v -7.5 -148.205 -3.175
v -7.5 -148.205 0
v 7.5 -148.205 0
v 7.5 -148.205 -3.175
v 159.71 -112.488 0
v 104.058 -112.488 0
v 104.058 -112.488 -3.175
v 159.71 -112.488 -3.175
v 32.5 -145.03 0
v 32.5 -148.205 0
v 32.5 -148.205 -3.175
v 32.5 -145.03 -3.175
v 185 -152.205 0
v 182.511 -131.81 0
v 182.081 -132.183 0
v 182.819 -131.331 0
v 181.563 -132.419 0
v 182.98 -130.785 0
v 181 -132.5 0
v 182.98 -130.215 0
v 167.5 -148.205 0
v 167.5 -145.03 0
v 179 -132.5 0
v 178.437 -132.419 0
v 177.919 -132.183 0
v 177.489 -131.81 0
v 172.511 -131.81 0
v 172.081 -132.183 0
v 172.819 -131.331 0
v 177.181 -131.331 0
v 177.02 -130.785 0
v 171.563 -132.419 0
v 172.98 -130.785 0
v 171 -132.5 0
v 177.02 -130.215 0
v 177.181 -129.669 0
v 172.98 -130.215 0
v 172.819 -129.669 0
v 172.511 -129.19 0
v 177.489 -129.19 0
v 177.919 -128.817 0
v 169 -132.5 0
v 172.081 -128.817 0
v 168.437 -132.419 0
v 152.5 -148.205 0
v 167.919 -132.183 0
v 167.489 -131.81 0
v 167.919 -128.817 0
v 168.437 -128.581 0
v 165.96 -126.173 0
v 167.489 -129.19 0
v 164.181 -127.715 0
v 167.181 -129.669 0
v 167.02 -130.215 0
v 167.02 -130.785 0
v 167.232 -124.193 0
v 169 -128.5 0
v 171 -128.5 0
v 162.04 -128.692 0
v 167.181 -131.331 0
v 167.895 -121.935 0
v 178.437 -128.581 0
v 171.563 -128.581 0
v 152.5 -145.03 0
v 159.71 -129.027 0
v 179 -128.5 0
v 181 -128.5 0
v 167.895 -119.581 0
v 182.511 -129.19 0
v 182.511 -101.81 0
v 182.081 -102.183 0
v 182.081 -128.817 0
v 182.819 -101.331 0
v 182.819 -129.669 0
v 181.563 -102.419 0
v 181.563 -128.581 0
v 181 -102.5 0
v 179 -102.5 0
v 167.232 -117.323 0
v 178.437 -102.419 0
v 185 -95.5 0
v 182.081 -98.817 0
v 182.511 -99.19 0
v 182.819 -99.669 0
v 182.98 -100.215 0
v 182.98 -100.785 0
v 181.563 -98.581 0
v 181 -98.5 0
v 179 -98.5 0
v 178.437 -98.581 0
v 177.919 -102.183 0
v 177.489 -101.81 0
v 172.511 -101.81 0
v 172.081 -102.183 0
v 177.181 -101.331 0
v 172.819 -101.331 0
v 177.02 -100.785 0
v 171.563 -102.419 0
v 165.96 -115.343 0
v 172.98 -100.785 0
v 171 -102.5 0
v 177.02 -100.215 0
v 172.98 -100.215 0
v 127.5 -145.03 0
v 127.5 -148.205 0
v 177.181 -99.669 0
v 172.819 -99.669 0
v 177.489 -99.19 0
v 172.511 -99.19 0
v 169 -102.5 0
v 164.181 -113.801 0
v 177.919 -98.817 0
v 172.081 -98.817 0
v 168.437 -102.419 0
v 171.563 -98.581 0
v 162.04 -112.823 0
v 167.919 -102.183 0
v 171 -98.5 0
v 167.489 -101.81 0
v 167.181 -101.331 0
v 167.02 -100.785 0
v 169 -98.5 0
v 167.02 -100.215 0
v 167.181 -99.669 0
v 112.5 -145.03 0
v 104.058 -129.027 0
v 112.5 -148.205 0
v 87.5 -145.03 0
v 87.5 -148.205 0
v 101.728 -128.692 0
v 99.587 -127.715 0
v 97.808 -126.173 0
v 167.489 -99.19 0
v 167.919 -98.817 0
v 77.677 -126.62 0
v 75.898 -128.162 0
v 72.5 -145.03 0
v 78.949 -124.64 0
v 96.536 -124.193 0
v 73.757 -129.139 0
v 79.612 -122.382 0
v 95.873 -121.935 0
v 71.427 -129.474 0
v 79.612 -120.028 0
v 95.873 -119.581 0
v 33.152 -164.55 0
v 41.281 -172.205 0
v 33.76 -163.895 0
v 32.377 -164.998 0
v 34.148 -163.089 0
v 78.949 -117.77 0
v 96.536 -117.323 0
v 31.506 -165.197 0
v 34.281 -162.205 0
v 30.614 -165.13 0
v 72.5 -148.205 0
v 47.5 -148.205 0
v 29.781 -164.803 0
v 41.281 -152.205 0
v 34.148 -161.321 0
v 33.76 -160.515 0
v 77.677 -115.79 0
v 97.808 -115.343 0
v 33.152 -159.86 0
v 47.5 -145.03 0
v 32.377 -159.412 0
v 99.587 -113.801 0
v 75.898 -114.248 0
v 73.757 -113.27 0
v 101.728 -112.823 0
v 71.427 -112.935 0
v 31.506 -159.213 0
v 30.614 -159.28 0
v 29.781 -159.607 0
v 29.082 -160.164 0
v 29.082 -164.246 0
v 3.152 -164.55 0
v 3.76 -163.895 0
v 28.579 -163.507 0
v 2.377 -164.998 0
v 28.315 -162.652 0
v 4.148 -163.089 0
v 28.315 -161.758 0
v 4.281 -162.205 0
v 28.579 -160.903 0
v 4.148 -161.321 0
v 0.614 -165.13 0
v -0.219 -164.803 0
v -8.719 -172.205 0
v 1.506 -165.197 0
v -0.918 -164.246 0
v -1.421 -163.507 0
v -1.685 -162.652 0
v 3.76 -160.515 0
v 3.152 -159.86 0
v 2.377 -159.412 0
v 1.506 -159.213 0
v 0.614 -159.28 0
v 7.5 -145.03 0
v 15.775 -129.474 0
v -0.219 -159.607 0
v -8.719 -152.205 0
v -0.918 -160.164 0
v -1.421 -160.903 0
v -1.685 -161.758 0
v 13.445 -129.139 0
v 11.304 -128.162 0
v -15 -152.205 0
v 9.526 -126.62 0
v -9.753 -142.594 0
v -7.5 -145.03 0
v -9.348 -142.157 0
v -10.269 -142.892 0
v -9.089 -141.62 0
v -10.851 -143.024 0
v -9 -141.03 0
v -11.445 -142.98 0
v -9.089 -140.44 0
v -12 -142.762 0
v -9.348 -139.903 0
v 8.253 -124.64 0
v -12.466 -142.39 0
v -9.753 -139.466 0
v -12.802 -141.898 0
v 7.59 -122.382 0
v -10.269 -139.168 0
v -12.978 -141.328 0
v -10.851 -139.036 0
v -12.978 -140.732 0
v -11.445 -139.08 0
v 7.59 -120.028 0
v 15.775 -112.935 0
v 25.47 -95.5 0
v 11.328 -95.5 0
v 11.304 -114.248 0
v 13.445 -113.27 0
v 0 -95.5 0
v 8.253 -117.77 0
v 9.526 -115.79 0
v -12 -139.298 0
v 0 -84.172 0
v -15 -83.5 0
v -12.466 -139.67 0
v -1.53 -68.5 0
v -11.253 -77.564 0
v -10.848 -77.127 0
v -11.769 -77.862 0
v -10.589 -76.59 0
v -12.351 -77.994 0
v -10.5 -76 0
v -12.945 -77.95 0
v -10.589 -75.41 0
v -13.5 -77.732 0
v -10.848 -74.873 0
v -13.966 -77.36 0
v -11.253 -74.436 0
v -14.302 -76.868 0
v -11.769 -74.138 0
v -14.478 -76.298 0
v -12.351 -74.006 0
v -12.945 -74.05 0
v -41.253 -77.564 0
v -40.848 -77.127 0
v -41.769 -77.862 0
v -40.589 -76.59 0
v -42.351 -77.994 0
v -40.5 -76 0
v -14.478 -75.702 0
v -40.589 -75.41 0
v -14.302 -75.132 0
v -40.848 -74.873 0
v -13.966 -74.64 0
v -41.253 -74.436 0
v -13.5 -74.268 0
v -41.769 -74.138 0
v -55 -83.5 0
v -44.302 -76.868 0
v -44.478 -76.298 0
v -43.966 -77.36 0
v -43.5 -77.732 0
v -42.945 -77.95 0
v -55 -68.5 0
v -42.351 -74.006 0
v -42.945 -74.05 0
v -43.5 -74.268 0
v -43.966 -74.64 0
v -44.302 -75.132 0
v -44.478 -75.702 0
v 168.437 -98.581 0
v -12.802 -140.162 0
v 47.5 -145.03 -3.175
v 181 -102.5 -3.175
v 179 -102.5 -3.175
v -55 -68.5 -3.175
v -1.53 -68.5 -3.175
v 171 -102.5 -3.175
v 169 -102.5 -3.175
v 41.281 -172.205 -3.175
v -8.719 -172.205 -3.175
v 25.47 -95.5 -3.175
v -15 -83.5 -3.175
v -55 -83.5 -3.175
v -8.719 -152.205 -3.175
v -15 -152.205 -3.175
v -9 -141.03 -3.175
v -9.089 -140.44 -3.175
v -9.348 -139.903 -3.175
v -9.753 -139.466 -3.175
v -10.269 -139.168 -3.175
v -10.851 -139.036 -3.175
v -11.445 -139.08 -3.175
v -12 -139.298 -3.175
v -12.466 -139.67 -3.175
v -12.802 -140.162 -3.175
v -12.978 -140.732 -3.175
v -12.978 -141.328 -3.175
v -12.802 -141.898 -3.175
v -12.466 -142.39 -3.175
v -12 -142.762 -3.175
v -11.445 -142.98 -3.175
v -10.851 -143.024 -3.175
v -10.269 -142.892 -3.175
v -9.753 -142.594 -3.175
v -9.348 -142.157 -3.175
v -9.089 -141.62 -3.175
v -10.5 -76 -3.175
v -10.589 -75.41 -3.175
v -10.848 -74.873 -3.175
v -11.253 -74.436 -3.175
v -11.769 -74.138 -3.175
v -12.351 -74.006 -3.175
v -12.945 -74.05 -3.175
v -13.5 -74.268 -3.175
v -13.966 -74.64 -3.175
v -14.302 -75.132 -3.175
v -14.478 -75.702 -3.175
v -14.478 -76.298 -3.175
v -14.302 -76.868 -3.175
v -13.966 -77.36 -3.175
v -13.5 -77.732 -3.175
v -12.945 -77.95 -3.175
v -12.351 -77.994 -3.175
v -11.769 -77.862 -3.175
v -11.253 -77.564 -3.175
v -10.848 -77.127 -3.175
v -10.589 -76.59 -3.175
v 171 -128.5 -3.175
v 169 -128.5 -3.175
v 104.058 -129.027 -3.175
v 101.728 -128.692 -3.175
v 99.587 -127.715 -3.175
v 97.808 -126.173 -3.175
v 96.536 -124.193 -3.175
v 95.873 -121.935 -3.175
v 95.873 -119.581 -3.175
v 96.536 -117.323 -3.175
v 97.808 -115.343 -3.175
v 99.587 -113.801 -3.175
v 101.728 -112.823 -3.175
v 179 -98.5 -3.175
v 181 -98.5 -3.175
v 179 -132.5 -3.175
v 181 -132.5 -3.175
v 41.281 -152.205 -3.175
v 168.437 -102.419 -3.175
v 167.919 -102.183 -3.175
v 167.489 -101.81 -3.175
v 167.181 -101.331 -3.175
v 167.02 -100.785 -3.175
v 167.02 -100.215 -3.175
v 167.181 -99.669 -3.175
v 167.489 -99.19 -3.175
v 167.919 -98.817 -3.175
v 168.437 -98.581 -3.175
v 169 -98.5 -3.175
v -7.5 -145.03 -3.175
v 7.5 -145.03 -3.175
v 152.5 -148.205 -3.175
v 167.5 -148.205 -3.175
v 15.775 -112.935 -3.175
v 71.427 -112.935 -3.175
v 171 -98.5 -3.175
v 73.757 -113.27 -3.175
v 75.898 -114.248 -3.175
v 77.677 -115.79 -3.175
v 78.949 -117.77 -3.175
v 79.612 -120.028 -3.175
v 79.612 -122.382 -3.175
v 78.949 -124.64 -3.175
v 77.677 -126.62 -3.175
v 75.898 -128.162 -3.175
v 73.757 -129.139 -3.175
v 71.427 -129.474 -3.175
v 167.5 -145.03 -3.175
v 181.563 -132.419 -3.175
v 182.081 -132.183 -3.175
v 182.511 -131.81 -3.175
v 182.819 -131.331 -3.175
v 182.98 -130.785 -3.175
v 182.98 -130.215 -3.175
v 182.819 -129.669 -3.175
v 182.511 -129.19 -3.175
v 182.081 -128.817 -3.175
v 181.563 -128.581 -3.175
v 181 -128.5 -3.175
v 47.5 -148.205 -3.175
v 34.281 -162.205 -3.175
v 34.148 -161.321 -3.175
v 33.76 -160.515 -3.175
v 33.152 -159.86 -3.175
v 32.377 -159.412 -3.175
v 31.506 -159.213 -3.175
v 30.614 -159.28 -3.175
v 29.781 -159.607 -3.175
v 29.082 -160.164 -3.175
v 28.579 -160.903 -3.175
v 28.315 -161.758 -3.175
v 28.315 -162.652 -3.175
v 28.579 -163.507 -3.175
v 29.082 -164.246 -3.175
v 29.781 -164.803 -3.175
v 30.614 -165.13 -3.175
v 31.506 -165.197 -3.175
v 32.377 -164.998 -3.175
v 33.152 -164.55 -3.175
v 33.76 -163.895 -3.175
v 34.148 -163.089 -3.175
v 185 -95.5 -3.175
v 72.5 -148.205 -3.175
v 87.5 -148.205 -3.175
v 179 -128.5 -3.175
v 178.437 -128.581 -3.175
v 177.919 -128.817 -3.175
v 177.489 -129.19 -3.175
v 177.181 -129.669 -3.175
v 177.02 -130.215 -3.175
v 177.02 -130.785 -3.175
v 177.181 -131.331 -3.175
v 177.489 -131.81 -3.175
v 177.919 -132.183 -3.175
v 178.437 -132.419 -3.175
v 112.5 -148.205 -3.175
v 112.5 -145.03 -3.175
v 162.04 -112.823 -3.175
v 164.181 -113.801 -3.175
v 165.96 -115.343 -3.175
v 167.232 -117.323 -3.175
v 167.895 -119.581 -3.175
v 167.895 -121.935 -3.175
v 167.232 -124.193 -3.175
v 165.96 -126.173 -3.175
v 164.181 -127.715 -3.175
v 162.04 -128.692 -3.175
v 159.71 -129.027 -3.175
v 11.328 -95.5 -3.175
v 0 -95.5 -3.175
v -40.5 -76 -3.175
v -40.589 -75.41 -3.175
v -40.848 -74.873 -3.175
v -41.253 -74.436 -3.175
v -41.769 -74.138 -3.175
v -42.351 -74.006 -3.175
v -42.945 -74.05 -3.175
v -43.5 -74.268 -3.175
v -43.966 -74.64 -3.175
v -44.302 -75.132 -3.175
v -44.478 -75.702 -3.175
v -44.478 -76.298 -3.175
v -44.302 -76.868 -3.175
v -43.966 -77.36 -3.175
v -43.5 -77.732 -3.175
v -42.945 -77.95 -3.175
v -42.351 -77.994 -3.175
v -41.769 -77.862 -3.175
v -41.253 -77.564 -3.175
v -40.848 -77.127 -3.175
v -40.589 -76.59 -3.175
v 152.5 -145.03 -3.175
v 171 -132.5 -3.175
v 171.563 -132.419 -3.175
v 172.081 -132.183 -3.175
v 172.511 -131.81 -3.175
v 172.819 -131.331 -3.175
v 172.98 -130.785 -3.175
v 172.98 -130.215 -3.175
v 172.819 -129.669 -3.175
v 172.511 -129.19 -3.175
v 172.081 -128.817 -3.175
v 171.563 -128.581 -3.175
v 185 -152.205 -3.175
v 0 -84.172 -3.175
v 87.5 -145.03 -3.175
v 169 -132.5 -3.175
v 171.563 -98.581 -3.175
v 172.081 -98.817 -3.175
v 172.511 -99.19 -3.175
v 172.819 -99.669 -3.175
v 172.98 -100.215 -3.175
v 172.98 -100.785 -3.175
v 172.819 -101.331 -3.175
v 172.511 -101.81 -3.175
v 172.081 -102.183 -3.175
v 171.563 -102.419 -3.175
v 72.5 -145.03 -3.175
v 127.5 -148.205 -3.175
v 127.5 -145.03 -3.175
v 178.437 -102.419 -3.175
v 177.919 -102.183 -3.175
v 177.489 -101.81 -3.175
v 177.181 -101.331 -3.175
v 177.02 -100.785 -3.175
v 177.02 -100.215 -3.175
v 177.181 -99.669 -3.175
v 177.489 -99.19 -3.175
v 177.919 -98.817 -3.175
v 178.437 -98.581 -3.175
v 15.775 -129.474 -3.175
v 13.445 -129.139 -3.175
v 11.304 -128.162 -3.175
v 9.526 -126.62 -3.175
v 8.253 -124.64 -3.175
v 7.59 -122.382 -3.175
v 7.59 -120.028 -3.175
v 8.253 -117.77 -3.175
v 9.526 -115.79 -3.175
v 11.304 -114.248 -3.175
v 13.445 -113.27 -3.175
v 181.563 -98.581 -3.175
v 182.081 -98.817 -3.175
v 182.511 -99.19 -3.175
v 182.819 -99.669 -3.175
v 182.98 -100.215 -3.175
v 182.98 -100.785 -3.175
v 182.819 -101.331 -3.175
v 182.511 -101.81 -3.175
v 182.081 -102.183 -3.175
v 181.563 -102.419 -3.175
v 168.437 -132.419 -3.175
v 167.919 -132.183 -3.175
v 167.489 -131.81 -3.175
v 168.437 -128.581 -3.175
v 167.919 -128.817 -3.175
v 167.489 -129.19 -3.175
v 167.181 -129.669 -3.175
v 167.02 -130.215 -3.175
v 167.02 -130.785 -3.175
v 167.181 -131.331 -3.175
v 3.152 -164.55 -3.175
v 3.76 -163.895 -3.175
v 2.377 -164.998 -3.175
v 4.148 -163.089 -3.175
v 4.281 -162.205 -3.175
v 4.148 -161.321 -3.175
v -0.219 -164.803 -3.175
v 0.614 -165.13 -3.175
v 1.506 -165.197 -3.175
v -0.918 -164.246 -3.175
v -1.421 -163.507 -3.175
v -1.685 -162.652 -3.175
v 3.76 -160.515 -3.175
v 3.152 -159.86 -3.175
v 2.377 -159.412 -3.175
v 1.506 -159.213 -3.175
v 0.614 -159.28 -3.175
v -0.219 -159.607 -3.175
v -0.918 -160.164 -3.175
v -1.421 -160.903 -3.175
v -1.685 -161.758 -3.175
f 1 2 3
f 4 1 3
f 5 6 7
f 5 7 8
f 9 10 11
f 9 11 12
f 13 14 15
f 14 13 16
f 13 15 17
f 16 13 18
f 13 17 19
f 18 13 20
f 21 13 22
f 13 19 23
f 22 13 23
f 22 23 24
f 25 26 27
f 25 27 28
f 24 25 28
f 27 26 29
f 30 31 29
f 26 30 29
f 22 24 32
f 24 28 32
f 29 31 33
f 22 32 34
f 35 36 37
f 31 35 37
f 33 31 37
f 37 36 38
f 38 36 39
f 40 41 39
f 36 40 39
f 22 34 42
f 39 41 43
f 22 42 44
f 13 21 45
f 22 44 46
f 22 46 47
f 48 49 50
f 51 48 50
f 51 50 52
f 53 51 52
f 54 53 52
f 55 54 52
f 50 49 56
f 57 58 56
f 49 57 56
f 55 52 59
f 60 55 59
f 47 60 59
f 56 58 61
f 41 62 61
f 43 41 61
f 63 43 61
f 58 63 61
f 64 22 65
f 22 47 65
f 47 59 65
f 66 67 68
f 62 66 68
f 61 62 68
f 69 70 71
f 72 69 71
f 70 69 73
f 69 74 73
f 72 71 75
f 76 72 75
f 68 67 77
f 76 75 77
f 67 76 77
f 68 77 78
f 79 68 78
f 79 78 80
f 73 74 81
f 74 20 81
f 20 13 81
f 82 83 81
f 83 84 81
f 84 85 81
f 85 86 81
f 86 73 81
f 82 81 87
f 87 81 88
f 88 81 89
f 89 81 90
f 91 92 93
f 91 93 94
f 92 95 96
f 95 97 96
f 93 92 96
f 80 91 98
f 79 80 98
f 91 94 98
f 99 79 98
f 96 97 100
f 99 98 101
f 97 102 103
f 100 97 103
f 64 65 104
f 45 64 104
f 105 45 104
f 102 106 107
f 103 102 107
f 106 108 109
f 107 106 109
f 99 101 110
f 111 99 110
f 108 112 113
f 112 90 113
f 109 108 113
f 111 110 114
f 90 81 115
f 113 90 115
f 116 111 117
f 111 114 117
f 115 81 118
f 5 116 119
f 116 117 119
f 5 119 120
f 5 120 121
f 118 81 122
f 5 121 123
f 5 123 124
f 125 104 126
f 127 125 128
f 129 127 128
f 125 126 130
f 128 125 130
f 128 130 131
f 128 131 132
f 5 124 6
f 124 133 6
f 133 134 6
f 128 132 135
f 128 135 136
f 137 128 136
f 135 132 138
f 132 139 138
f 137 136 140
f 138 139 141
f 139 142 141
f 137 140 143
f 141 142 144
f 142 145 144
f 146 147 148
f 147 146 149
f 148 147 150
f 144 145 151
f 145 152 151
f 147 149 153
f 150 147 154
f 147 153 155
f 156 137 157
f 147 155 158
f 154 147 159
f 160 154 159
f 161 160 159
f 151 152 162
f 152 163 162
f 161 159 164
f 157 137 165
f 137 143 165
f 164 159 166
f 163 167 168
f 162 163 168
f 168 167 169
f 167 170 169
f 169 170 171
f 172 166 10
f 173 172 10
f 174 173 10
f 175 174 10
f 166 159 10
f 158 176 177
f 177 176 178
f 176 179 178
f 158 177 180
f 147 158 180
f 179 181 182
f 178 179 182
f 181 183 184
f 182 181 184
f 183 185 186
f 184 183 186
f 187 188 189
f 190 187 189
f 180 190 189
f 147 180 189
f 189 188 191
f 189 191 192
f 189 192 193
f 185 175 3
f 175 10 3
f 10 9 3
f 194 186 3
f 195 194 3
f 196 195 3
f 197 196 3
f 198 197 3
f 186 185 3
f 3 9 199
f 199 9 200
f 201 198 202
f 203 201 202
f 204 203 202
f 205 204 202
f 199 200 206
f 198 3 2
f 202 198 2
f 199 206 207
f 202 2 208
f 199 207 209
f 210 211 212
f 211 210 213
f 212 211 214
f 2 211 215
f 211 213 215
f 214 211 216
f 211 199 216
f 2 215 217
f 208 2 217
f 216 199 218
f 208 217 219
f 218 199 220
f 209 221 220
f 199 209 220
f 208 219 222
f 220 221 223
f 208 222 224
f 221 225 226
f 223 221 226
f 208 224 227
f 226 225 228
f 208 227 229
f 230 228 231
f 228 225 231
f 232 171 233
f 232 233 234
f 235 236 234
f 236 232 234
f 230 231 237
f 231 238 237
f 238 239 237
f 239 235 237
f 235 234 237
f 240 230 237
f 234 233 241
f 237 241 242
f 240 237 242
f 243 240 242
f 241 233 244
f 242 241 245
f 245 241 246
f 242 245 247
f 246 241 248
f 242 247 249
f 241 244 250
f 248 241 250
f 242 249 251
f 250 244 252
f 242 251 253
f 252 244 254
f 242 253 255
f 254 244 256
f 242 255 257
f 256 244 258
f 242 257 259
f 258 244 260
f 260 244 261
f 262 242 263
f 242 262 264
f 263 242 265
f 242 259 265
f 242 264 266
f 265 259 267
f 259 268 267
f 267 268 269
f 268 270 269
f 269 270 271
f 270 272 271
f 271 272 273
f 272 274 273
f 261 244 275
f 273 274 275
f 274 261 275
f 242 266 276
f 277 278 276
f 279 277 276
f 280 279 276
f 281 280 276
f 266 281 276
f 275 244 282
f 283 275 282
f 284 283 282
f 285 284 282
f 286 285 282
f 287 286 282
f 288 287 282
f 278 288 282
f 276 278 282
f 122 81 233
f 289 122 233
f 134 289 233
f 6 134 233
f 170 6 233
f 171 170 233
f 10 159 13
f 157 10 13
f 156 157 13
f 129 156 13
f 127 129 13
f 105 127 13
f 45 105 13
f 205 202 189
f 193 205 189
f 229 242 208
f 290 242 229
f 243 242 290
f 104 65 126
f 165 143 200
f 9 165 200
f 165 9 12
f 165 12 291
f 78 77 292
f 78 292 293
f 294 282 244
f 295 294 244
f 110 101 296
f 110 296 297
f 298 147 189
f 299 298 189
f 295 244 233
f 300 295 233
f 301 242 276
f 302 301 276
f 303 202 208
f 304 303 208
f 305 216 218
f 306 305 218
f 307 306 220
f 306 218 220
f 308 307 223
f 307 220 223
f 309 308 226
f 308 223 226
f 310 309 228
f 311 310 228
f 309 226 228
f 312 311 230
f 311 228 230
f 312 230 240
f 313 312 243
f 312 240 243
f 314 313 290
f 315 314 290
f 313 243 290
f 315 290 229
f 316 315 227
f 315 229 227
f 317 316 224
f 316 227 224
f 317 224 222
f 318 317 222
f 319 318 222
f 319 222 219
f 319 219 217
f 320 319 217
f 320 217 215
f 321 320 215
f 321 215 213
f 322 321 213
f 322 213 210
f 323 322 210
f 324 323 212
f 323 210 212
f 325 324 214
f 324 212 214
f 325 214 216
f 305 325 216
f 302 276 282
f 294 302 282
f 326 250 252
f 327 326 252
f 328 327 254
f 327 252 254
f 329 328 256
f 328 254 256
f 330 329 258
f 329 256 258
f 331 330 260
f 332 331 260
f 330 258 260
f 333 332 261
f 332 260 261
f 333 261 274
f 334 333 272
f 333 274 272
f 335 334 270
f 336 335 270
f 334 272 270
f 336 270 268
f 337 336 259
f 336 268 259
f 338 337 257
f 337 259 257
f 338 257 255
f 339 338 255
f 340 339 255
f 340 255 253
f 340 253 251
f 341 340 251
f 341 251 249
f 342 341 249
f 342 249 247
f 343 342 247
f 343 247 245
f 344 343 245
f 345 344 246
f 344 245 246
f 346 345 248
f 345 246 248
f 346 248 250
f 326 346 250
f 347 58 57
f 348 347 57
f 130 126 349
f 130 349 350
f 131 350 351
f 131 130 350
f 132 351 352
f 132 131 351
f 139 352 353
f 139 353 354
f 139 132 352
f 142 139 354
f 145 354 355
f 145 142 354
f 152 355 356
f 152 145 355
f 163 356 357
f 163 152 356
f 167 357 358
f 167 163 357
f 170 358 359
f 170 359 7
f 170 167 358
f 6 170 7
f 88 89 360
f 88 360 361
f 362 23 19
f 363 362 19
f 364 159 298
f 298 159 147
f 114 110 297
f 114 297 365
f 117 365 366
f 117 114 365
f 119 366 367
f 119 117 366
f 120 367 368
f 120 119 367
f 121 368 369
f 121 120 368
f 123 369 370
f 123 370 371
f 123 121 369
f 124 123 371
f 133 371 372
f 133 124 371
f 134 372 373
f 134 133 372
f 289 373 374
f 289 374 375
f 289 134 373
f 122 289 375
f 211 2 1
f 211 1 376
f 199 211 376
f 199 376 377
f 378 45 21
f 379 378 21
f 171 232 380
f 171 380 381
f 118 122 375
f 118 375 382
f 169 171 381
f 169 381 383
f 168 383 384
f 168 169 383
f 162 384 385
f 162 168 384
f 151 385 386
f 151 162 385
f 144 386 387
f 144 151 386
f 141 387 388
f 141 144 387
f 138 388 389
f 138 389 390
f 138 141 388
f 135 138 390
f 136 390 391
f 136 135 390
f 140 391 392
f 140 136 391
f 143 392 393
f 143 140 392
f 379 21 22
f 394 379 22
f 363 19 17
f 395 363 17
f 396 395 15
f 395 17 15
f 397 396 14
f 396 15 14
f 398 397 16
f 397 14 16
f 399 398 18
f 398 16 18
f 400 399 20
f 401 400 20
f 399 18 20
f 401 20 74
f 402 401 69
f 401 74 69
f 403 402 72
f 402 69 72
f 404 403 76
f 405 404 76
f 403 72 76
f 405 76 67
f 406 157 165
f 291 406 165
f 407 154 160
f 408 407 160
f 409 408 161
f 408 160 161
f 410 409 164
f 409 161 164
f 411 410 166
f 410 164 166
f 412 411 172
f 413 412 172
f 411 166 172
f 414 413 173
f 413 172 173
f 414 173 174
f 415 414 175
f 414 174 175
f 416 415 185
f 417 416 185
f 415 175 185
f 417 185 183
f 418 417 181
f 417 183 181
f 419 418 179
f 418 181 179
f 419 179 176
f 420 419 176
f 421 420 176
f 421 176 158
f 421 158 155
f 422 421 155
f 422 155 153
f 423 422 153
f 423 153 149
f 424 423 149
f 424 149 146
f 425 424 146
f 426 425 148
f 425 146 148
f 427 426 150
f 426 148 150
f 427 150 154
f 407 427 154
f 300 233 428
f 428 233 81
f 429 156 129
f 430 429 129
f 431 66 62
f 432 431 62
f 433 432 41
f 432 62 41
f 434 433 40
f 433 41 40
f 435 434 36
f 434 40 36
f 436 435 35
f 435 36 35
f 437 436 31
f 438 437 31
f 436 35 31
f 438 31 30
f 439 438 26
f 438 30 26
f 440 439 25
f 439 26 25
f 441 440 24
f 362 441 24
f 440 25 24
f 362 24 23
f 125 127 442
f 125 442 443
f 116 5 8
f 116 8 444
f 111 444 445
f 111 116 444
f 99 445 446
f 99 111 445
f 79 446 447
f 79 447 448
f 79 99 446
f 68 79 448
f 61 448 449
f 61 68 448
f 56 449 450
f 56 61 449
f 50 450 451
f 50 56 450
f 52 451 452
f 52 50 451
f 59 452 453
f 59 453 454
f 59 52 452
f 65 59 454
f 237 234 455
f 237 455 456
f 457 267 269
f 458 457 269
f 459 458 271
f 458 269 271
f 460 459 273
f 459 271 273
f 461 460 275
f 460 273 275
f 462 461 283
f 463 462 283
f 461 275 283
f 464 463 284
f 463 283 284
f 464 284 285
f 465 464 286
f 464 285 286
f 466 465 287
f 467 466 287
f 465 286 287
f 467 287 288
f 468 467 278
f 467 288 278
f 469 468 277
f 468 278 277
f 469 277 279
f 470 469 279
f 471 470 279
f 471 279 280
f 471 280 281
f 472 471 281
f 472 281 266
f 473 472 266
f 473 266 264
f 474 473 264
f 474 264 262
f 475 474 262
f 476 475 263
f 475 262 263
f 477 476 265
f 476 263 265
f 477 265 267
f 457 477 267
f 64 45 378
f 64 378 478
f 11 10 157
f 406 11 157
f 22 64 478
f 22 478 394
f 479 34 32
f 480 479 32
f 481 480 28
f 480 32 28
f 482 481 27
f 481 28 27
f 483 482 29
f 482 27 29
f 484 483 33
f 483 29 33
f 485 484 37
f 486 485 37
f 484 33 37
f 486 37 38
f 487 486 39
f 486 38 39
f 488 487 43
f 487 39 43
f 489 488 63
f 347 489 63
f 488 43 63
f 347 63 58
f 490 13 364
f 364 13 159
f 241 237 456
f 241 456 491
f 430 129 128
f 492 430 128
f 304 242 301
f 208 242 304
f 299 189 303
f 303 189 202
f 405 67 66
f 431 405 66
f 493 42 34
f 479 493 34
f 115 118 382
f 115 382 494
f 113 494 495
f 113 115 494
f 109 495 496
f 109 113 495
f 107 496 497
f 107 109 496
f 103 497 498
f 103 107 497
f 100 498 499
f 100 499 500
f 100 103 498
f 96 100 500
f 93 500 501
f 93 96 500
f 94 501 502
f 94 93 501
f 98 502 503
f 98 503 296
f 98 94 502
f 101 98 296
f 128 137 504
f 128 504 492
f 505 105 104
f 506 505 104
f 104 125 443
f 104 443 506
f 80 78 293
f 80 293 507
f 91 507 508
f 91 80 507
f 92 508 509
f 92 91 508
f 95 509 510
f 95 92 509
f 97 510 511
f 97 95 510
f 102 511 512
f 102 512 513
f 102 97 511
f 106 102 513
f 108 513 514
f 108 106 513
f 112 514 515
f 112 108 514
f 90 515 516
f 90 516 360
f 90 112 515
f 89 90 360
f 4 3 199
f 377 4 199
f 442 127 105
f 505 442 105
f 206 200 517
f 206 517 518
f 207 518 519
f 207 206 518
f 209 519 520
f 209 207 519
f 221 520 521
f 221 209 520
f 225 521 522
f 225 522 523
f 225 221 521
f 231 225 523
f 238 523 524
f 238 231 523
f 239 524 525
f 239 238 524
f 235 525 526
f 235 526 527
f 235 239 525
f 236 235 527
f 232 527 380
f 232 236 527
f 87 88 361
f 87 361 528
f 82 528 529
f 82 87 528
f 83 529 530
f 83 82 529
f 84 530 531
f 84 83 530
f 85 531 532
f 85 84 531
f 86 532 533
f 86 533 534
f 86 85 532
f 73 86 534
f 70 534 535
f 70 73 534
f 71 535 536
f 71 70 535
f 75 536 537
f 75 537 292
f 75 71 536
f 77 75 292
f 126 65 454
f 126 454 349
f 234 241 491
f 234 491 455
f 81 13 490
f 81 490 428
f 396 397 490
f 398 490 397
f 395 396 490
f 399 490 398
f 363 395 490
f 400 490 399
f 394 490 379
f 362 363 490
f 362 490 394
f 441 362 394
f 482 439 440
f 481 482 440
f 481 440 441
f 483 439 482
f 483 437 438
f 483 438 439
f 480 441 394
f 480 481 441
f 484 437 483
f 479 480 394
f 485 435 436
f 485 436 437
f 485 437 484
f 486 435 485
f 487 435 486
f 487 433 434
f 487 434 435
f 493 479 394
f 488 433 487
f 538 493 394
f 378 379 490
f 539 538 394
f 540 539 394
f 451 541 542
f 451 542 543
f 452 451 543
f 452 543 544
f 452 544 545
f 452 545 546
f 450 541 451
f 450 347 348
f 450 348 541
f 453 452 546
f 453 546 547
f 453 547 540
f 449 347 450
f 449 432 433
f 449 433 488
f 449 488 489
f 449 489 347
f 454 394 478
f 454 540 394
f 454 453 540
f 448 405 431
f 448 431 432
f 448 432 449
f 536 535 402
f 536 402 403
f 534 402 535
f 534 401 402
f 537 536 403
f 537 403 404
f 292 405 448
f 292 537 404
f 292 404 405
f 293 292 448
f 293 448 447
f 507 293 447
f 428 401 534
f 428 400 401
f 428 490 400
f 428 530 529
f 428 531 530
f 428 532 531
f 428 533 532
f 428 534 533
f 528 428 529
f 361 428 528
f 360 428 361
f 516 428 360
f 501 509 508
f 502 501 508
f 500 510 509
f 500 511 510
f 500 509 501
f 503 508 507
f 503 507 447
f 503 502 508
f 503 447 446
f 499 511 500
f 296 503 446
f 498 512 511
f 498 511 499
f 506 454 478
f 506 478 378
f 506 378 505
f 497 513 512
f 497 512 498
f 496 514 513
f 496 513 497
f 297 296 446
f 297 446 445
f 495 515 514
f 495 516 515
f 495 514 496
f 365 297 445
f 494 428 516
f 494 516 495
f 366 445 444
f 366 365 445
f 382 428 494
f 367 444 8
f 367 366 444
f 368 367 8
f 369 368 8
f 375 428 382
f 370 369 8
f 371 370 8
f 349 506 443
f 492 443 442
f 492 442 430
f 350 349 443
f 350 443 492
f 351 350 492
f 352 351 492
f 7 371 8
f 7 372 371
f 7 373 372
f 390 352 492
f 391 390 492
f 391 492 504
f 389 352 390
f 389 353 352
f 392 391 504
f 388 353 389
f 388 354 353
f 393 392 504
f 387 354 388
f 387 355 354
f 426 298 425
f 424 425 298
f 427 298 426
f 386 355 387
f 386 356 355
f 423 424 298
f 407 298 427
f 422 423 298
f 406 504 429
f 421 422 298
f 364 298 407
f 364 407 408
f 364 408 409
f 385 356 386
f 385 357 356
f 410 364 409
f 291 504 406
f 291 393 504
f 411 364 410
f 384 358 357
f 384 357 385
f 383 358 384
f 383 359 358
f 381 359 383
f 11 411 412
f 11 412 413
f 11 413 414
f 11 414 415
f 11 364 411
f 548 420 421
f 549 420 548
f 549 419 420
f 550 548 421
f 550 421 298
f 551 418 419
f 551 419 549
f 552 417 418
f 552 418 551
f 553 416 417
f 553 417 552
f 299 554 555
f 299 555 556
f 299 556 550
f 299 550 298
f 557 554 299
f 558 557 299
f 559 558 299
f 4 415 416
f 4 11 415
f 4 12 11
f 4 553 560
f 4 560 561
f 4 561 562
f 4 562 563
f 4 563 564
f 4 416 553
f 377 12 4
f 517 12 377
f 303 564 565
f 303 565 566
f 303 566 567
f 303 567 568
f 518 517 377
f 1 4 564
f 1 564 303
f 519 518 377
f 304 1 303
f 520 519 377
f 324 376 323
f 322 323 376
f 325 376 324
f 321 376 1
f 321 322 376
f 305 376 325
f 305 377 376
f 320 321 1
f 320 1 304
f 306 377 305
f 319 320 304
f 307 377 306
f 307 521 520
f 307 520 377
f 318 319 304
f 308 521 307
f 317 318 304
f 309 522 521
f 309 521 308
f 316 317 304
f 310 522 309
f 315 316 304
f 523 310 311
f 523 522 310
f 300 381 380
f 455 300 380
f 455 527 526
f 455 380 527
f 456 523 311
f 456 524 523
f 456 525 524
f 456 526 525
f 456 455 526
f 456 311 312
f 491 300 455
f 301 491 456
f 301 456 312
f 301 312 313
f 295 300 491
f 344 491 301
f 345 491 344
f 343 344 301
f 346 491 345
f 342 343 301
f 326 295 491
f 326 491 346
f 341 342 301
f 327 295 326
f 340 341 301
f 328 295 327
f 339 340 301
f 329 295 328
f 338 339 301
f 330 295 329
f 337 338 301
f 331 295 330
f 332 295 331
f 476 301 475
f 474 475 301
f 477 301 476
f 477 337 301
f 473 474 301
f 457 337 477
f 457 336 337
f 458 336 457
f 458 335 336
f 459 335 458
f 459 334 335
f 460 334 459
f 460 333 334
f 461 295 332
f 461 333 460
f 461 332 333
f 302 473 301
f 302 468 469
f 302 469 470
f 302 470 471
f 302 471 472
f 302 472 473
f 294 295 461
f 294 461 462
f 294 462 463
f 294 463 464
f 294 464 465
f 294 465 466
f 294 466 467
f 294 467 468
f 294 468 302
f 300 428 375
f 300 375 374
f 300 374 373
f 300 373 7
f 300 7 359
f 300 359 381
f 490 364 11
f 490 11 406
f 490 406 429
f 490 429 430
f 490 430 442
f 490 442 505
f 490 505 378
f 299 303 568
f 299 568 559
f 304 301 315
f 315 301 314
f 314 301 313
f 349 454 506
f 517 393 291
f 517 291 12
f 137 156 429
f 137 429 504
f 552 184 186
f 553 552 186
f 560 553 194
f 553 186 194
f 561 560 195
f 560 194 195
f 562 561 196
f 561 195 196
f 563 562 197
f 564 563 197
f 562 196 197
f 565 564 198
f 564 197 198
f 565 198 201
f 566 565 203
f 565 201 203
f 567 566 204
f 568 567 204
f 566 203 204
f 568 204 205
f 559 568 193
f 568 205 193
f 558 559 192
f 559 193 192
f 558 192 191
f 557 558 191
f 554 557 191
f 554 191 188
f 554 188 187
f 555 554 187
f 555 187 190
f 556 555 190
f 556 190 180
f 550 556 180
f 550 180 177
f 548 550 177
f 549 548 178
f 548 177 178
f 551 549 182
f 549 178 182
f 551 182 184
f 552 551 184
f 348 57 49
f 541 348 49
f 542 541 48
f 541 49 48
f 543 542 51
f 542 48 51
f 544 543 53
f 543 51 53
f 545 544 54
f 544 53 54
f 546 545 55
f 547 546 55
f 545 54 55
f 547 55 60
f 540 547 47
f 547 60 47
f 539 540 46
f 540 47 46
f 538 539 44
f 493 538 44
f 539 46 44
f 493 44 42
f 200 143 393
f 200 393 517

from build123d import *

# Parameters (mm, degrees)
SKETCH1_R          = 3
SKETCH1_R_2        = 2
SKETCH1_W          = 15
SKETCH1_H          = 3.175
BASE_FLANGE1_DEPTH = 3.175


# Sheet-metal steps are written as plain solids
with BuildPart() as part:
    # Sketch1 → Base-Flange1 (new body)
    with BuildSketch(Plane.XY):
        Polygon((-1.53, -68.5), (25.47, -95.5), (185, -95.5), (185, -143.5), (185, -148.5), (185, -152.205), (41.281460478, -152.205), (41.281460478, -172.205), (-8.718539522, -172.205), (-8.718539522, -152.205), (-15, -152.205), (-15, -150.03), (-15, -83.5), (-55, -83.5), (-55, -68.5), align=None)
        with Locations((1.281460478, -162.205)):
            Circle(SKETCH1_R, mode=Mode.SUBTRACT)
        with Locations((31.281460478, -162.205)):
            Circle(SKETCH1_R, mode=Mode.SUBTRACT)
        with Locations((-42.5, -76)):
            Circle(SKETCH1_R_2, mode=Mode.SUBTRACT)
        with Locations((-12.5, -76)):
            Circle(SKETCH1_R_2, mode=Mode.SUBTRACT)
        with Locations((-11, -141.03)):
            Circle(SKETCH1_R_2, mode=Mode.SUBTRACT)
        with Locations((160, -146.6175)):
            Rectangle(SKETCH1_W, SKETCH1_H, mode=Mode.SUBTRACT)
        with Locations((40, -146.6175)):
            Rectangle(SKETCH1_W, SKETCH1_H, mode=Mode.SUBTRACT)
        with Locations((0, -146.6175)):
            Rectangle(SKETCH1_W, SKETCH1_H, mode=Mode.SUBTRACT)
        Polygon((0, -84.172135624), (11.327864376, -95.5), (0, -95.5), align=None, mode=Mode.SUBTRACT)
        with Locations((80, -146.6175)):
            Rectangle(SKETCH1_W, SKETCH1_H, mode=Mode.SUBTRACT)
        with Locations((120, -146.6175)):
            Rectangle(SKETCH1_W, SKETCH1_H, mode=Mode.SUBTRACT)
        with BuildLine():
            Line((104.058089569, -112.488390285), (159.709824243, -112.488390285))
            ThreePointArc((159.709824243, -112.488390285), (167.979359115, -120.757925156), (159.709824243, -129.027460028))
            Line((159.709824243, -129.027460028), (104.058089569, -129.027460028))
            ThreePointArc((104.058089569, -129.027460028), (95.788554697, -120.757925156), (104.058089569, -112.488390285))
        make_face(mode=Mode.SUBTRACT)
        with BuildLine():
            Line((15.775217294, -112.93539217), (71.426951968, -112.93539217))
            ThreePointArc((71.426951968, -112.93539217), (79.69648684, -121.204927041), (71.426951968, -129.474461913))
            Line((71.426951968, -129.474461913), (15.775217294, -129.474461913))
            ThreePointArc((15.775217294, -129.474461913), (7.505682422, -121.204927041), (15.775217294, -112.93539217))
        make_face(mode=Mode.SUBTRACT)
        with BuildLine():
            Line((181, -102.5), (179, -102.5))
            ThreePointArc((179, -102.5), (177, -100.5), (179, -98.5))
            Line((179, -98.5), (181, -98.5))
            ThreePointArc((181, -98.5), (183, -100.5), (181, -102.5))
        make_face(mode=Mode.SUBTRACT)
        with BuildLine():
            Line((171, -102.5), (169, -102.5))
            ThreePointArc((169, -102.5), (167, -100.5), (169, -98.5))
            Line((169, -98.5), (171, -98.5))
            ThreePointArc((171, -98.5), (173, -100.5), (171, -102.5))
        make_face(mode=Mode.SUBTRACT)
        with BuildLine():
            Line((171, -128.5), (169, -128.5))
            ThreePointArc((169, -128.5), (167, -130.5), (169, -132.5))
            Line((169, -132.5), (171, -132.5))
            ThreePointArc((171, -132.5), (173, -130.5), (171, -128.5))
        make_face(mode=Mode.SUBTRACT)
        with BuildLine():
            Line((181, -128.5), (179, -128.5))
            ThreePointArc((179, -128.5), (177, -130.5), (179, -132.5))
            Line((179, -132.5), (181, -132.5))
            ThreePointArc((181, -132.5), (183, -130.5), (181, -128.5))
        make_face(mode=Mode.SUBTRACT)
    extrude(amount=-BASE_FLANGE1_DEPTH)


solid = part.part
